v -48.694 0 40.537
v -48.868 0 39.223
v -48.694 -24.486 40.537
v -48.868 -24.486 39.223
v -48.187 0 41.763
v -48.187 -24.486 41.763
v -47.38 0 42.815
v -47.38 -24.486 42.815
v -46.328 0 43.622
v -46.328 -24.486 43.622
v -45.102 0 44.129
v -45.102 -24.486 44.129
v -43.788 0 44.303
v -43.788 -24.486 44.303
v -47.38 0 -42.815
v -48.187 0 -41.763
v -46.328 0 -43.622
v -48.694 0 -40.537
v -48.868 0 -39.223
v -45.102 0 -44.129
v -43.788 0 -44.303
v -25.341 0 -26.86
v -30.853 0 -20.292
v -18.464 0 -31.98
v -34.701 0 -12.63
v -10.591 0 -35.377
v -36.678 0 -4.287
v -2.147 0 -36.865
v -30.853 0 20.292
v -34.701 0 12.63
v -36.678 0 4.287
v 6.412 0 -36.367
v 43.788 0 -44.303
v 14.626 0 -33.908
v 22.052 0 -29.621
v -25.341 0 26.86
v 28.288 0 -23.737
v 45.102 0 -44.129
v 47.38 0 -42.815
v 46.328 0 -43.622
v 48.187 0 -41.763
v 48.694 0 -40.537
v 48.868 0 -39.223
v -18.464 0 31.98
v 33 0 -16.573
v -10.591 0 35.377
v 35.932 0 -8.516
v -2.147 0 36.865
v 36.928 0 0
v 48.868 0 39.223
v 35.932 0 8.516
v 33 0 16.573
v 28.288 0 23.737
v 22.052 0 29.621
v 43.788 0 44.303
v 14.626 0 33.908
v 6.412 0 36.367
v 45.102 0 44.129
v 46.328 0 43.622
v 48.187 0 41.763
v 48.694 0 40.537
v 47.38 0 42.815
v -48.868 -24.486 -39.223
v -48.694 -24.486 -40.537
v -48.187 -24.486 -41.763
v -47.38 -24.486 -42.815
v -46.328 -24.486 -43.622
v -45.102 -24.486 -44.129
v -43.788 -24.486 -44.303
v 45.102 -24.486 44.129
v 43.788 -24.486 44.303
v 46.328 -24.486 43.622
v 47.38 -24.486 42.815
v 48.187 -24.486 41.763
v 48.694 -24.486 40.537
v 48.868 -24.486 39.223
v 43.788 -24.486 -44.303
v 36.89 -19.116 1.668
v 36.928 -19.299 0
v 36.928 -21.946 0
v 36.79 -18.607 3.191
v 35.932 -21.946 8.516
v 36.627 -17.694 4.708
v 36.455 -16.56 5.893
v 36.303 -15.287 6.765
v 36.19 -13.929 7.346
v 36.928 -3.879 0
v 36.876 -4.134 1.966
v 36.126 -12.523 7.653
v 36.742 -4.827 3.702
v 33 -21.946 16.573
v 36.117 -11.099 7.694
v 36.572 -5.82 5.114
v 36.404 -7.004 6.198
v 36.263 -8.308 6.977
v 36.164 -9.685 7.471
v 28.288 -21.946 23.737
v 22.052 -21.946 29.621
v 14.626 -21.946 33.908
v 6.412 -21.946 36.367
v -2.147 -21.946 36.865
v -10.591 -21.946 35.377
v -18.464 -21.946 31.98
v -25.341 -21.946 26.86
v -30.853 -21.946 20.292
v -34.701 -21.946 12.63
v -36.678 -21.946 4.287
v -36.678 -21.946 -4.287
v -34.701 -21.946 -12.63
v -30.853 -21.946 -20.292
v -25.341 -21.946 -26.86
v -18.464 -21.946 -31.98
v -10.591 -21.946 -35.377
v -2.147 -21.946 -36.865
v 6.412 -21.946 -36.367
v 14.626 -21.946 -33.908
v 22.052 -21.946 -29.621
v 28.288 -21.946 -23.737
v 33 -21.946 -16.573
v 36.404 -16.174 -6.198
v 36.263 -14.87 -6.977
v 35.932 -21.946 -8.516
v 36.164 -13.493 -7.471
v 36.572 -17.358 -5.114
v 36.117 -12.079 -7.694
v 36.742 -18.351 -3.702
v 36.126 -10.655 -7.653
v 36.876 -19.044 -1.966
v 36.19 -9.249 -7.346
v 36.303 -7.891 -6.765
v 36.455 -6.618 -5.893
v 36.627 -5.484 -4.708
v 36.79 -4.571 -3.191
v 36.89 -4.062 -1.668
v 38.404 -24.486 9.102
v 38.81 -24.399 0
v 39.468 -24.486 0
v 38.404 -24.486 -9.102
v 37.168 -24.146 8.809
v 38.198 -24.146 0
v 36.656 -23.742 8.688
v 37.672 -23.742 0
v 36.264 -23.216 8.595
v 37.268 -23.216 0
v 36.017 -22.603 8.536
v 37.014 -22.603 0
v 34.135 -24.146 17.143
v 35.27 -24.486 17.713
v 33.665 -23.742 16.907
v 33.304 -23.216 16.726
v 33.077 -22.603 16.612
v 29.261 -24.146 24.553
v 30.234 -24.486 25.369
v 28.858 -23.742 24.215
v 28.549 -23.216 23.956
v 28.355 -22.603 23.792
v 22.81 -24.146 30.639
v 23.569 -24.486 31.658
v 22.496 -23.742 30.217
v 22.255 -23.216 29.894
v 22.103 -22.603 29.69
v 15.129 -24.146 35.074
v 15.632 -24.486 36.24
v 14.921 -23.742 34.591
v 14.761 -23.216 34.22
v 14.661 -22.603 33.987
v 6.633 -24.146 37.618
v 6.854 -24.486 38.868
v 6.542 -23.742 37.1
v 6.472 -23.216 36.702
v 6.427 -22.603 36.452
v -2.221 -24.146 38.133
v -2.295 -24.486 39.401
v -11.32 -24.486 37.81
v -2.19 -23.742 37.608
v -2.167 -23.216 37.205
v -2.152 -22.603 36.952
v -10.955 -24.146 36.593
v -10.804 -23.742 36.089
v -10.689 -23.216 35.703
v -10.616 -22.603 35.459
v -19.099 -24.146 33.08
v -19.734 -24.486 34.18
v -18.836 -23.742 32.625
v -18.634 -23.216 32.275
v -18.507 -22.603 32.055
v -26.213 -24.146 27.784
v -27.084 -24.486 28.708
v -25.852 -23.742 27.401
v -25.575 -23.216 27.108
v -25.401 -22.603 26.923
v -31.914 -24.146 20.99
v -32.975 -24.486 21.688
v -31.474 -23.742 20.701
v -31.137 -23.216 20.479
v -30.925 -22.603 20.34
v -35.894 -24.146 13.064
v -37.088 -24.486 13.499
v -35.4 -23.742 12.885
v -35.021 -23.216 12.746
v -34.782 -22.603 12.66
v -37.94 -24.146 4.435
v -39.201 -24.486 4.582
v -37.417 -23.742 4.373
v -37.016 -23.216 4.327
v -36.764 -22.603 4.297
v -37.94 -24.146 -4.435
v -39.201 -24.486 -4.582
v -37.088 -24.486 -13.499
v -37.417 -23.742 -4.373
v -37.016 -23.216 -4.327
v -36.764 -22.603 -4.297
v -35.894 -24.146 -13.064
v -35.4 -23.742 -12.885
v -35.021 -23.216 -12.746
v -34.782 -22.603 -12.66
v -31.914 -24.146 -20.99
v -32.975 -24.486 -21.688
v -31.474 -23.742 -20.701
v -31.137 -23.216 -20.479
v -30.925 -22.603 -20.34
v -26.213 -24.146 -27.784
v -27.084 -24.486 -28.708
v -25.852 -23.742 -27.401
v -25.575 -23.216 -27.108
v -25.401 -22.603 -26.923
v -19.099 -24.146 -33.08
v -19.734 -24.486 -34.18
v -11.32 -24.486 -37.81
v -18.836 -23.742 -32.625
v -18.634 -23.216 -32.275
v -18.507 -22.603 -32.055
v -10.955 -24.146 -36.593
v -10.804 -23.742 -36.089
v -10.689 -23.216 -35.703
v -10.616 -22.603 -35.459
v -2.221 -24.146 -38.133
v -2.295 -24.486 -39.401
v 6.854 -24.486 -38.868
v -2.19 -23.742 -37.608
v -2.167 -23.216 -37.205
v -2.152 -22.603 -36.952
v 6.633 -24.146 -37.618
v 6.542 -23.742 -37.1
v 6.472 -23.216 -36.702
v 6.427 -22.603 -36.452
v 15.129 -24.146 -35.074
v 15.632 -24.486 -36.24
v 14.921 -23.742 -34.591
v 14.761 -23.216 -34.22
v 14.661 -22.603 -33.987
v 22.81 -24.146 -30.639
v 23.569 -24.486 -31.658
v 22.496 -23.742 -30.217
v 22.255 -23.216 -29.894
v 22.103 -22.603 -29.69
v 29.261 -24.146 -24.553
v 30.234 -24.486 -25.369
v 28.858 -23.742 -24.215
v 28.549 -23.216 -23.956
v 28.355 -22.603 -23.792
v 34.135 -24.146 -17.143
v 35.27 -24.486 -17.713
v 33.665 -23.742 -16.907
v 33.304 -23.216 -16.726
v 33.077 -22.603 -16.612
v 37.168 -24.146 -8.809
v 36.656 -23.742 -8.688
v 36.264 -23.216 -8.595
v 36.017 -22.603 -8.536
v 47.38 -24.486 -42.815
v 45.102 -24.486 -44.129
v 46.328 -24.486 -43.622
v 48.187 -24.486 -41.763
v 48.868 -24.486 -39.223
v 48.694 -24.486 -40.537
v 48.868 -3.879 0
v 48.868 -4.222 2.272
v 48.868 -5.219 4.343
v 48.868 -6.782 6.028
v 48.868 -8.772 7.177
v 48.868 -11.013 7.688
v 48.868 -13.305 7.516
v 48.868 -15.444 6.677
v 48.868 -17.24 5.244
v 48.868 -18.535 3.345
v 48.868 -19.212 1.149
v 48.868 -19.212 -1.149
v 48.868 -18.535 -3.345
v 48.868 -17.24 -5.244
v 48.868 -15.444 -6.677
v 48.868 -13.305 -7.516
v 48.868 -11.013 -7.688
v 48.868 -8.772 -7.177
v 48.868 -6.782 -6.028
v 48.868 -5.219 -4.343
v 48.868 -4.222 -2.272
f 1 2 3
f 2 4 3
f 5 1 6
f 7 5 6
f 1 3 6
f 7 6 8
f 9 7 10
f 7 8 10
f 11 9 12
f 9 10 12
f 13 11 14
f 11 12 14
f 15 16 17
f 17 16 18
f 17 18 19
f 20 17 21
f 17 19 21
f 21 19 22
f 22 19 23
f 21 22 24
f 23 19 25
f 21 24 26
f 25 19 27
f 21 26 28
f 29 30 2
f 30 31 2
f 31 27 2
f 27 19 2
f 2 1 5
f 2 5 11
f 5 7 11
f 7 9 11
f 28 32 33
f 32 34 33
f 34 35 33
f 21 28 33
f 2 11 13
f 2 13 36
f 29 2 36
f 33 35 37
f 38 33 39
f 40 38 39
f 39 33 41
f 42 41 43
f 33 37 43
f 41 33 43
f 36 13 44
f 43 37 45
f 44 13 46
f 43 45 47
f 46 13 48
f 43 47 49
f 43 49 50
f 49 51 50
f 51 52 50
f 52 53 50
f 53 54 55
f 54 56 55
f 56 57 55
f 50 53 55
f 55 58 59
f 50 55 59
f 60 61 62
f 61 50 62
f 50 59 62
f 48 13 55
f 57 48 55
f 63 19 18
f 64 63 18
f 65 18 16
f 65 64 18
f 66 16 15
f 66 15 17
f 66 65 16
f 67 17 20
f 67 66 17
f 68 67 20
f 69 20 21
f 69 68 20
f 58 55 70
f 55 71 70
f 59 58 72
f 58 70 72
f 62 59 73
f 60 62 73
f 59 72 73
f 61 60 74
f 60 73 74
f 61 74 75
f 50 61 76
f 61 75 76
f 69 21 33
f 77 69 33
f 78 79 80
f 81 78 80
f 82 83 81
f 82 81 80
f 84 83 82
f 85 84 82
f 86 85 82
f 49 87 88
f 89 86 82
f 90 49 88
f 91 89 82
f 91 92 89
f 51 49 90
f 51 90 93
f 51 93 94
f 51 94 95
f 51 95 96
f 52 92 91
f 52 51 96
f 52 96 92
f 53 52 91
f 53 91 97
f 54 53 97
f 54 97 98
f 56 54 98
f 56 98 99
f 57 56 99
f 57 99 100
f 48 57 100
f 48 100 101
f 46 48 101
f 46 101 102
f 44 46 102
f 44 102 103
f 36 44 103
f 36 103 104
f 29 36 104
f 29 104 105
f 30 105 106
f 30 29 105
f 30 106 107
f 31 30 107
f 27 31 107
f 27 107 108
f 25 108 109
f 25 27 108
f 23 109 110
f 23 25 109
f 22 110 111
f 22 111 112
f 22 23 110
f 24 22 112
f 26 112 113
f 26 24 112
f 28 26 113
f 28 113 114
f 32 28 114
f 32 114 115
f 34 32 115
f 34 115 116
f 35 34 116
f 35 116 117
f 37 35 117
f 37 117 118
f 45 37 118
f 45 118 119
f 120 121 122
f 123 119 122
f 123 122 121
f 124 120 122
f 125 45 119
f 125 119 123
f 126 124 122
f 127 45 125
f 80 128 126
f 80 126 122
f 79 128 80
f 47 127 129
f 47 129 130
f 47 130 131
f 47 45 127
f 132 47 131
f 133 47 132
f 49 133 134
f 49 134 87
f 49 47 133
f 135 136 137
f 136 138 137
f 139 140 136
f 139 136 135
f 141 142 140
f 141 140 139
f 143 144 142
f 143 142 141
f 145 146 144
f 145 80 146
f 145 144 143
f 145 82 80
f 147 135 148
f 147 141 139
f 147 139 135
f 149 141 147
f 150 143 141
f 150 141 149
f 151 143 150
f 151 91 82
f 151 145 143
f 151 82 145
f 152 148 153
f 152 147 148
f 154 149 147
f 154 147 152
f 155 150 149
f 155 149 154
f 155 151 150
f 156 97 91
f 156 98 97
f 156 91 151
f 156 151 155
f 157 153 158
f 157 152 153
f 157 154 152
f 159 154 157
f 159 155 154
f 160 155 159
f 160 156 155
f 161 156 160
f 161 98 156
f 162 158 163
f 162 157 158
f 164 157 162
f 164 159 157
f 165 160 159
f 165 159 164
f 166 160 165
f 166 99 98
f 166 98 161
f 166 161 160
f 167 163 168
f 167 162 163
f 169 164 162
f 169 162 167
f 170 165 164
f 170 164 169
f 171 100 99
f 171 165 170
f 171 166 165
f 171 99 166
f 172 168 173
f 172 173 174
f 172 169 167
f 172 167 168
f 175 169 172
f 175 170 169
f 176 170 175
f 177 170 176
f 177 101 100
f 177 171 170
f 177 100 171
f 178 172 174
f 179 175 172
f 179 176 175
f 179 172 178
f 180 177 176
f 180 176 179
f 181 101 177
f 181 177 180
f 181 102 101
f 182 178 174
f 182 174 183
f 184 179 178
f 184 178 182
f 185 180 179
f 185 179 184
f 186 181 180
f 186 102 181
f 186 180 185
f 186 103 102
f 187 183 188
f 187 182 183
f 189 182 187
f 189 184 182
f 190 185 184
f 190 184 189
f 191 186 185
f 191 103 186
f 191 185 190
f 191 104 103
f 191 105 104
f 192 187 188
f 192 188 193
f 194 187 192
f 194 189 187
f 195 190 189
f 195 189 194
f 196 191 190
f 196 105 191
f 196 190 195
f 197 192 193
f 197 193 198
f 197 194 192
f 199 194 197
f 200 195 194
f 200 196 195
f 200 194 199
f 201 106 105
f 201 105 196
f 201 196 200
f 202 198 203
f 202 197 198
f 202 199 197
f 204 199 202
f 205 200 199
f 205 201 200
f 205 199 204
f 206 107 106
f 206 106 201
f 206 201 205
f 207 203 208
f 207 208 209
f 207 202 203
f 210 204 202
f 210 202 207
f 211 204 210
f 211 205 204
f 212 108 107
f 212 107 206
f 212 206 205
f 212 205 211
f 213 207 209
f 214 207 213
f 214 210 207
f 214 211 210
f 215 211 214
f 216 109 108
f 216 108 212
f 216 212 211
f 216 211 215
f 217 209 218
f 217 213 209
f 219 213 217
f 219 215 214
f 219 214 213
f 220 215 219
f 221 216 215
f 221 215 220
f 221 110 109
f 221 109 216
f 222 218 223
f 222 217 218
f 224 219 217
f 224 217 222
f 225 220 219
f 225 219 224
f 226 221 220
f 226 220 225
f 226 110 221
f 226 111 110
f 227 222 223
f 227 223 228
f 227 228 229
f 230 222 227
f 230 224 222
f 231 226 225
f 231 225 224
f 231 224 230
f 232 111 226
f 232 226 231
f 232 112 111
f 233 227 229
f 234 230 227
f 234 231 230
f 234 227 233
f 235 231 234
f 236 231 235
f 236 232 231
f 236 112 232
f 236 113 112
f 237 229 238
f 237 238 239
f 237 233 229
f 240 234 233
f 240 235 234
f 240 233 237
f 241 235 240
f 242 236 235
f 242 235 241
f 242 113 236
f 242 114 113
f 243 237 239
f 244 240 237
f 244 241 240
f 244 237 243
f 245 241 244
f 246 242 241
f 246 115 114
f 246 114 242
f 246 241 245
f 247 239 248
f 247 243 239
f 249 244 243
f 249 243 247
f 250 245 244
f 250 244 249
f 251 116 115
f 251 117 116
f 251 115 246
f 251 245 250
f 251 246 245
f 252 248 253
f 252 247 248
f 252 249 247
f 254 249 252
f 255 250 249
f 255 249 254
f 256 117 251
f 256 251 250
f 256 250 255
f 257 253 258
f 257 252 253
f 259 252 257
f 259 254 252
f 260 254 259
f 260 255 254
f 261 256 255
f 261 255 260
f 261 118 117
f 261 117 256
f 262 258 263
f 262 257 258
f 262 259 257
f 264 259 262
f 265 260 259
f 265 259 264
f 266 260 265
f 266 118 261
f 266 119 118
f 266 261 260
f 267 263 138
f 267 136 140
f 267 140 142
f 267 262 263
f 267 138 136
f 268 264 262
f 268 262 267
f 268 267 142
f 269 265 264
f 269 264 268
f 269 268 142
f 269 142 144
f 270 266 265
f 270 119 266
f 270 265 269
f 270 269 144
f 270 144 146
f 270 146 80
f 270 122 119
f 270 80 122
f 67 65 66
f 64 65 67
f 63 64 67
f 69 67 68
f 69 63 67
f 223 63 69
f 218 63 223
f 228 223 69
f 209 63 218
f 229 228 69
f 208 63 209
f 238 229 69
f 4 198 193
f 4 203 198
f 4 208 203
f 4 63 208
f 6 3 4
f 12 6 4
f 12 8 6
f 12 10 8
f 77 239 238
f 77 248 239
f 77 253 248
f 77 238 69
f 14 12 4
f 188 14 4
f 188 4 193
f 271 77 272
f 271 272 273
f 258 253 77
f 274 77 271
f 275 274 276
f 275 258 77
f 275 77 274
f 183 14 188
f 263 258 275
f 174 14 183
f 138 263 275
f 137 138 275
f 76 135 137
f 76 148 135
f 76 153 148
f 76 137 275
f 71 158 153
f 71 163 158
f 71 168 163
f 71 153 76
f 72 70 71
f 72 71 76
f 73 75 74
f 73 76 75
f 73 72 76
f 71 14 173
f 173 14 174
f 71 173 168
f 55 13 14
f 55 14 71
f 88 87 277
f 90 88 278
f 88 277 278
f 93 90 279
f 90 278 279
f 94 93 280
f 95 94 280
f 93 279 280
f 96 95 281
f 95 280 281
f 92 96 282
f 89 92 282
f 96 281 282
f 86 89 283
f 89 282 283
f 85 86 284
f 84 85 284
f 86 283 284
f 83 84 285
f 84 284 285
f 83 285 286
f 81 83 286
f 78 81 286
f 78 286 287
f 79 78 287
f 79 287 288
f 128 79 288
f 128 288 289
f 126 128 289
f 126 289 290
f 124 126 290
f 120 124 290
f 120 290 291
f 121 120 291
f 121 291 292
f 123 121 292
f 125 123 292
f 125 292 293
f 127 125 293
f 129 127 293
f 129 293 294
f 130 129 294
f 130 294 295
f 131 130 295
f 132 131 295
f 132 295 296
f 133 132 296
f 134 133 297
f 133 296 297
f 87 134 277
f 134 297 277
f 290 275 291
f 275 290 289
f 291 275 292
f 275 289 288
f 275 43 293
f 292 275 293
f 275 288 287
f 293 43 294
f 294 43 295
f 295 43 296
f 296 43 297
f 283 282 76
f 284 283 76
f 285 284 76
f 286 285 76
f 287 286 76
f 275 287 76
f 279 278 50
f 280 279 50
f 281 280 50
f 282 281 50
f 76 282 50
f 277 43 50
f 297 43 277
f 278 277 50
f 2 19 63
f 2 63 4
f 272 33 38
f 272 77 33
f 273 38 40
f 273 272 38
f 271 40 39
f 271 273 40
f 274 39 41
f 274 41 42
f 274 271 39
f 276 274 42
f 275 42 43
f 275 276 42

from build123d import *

# Parameters (mm, degrees)
F0_W     = 97.735152
F0_H     = 88.60518
F0_R     = 36.927875
F1_DEPTH = 24.485806
F2_R     = 5.08
F3_R     = 7.709535
F4_DEPTH = 25.4
F5_R     = 2.54


with BuildPart() as f1:
    # F0 (on Front) → F1 (new body)
    with BuildSketch(Plane.XZ):
        Rectangle(F0_W, F0_H)
        Circle(F0_R, mode=Mode.SUBTRACT)
    extrude(amount=F1_DEPTH)

    # F2
    f2_edges = [f1.edges().sort_by_distance(p)[0] for p in [
        (48.867576, -12.242903, 44.30259),
        (48.867576, -12.242903, -44.30259),
        (-48.867576, -12.242903, 44.30259),
        (-48.867576, -12.242903, -44.30259),
    ]]
    fillet(f2_edges, radius=F2_R)

    # F3 (on face) → F4 (cut)
    with BuildSketch(Plane.YZ.offset(48.867576)):
        with Locations((-11.589006, 0)):
            Circle(F3_R)
    extrude(amount=-F4_DEPTH, mode=Mode.SUBTRACT)

    # F5
    f5_edges = [f1.edges().sort_by_distance(p)[0] for p in [
        (-36.927875, -24.485806, 0),
    ]]
    fillet(f5_edges, radius=F5_R)


solid = f1.part
